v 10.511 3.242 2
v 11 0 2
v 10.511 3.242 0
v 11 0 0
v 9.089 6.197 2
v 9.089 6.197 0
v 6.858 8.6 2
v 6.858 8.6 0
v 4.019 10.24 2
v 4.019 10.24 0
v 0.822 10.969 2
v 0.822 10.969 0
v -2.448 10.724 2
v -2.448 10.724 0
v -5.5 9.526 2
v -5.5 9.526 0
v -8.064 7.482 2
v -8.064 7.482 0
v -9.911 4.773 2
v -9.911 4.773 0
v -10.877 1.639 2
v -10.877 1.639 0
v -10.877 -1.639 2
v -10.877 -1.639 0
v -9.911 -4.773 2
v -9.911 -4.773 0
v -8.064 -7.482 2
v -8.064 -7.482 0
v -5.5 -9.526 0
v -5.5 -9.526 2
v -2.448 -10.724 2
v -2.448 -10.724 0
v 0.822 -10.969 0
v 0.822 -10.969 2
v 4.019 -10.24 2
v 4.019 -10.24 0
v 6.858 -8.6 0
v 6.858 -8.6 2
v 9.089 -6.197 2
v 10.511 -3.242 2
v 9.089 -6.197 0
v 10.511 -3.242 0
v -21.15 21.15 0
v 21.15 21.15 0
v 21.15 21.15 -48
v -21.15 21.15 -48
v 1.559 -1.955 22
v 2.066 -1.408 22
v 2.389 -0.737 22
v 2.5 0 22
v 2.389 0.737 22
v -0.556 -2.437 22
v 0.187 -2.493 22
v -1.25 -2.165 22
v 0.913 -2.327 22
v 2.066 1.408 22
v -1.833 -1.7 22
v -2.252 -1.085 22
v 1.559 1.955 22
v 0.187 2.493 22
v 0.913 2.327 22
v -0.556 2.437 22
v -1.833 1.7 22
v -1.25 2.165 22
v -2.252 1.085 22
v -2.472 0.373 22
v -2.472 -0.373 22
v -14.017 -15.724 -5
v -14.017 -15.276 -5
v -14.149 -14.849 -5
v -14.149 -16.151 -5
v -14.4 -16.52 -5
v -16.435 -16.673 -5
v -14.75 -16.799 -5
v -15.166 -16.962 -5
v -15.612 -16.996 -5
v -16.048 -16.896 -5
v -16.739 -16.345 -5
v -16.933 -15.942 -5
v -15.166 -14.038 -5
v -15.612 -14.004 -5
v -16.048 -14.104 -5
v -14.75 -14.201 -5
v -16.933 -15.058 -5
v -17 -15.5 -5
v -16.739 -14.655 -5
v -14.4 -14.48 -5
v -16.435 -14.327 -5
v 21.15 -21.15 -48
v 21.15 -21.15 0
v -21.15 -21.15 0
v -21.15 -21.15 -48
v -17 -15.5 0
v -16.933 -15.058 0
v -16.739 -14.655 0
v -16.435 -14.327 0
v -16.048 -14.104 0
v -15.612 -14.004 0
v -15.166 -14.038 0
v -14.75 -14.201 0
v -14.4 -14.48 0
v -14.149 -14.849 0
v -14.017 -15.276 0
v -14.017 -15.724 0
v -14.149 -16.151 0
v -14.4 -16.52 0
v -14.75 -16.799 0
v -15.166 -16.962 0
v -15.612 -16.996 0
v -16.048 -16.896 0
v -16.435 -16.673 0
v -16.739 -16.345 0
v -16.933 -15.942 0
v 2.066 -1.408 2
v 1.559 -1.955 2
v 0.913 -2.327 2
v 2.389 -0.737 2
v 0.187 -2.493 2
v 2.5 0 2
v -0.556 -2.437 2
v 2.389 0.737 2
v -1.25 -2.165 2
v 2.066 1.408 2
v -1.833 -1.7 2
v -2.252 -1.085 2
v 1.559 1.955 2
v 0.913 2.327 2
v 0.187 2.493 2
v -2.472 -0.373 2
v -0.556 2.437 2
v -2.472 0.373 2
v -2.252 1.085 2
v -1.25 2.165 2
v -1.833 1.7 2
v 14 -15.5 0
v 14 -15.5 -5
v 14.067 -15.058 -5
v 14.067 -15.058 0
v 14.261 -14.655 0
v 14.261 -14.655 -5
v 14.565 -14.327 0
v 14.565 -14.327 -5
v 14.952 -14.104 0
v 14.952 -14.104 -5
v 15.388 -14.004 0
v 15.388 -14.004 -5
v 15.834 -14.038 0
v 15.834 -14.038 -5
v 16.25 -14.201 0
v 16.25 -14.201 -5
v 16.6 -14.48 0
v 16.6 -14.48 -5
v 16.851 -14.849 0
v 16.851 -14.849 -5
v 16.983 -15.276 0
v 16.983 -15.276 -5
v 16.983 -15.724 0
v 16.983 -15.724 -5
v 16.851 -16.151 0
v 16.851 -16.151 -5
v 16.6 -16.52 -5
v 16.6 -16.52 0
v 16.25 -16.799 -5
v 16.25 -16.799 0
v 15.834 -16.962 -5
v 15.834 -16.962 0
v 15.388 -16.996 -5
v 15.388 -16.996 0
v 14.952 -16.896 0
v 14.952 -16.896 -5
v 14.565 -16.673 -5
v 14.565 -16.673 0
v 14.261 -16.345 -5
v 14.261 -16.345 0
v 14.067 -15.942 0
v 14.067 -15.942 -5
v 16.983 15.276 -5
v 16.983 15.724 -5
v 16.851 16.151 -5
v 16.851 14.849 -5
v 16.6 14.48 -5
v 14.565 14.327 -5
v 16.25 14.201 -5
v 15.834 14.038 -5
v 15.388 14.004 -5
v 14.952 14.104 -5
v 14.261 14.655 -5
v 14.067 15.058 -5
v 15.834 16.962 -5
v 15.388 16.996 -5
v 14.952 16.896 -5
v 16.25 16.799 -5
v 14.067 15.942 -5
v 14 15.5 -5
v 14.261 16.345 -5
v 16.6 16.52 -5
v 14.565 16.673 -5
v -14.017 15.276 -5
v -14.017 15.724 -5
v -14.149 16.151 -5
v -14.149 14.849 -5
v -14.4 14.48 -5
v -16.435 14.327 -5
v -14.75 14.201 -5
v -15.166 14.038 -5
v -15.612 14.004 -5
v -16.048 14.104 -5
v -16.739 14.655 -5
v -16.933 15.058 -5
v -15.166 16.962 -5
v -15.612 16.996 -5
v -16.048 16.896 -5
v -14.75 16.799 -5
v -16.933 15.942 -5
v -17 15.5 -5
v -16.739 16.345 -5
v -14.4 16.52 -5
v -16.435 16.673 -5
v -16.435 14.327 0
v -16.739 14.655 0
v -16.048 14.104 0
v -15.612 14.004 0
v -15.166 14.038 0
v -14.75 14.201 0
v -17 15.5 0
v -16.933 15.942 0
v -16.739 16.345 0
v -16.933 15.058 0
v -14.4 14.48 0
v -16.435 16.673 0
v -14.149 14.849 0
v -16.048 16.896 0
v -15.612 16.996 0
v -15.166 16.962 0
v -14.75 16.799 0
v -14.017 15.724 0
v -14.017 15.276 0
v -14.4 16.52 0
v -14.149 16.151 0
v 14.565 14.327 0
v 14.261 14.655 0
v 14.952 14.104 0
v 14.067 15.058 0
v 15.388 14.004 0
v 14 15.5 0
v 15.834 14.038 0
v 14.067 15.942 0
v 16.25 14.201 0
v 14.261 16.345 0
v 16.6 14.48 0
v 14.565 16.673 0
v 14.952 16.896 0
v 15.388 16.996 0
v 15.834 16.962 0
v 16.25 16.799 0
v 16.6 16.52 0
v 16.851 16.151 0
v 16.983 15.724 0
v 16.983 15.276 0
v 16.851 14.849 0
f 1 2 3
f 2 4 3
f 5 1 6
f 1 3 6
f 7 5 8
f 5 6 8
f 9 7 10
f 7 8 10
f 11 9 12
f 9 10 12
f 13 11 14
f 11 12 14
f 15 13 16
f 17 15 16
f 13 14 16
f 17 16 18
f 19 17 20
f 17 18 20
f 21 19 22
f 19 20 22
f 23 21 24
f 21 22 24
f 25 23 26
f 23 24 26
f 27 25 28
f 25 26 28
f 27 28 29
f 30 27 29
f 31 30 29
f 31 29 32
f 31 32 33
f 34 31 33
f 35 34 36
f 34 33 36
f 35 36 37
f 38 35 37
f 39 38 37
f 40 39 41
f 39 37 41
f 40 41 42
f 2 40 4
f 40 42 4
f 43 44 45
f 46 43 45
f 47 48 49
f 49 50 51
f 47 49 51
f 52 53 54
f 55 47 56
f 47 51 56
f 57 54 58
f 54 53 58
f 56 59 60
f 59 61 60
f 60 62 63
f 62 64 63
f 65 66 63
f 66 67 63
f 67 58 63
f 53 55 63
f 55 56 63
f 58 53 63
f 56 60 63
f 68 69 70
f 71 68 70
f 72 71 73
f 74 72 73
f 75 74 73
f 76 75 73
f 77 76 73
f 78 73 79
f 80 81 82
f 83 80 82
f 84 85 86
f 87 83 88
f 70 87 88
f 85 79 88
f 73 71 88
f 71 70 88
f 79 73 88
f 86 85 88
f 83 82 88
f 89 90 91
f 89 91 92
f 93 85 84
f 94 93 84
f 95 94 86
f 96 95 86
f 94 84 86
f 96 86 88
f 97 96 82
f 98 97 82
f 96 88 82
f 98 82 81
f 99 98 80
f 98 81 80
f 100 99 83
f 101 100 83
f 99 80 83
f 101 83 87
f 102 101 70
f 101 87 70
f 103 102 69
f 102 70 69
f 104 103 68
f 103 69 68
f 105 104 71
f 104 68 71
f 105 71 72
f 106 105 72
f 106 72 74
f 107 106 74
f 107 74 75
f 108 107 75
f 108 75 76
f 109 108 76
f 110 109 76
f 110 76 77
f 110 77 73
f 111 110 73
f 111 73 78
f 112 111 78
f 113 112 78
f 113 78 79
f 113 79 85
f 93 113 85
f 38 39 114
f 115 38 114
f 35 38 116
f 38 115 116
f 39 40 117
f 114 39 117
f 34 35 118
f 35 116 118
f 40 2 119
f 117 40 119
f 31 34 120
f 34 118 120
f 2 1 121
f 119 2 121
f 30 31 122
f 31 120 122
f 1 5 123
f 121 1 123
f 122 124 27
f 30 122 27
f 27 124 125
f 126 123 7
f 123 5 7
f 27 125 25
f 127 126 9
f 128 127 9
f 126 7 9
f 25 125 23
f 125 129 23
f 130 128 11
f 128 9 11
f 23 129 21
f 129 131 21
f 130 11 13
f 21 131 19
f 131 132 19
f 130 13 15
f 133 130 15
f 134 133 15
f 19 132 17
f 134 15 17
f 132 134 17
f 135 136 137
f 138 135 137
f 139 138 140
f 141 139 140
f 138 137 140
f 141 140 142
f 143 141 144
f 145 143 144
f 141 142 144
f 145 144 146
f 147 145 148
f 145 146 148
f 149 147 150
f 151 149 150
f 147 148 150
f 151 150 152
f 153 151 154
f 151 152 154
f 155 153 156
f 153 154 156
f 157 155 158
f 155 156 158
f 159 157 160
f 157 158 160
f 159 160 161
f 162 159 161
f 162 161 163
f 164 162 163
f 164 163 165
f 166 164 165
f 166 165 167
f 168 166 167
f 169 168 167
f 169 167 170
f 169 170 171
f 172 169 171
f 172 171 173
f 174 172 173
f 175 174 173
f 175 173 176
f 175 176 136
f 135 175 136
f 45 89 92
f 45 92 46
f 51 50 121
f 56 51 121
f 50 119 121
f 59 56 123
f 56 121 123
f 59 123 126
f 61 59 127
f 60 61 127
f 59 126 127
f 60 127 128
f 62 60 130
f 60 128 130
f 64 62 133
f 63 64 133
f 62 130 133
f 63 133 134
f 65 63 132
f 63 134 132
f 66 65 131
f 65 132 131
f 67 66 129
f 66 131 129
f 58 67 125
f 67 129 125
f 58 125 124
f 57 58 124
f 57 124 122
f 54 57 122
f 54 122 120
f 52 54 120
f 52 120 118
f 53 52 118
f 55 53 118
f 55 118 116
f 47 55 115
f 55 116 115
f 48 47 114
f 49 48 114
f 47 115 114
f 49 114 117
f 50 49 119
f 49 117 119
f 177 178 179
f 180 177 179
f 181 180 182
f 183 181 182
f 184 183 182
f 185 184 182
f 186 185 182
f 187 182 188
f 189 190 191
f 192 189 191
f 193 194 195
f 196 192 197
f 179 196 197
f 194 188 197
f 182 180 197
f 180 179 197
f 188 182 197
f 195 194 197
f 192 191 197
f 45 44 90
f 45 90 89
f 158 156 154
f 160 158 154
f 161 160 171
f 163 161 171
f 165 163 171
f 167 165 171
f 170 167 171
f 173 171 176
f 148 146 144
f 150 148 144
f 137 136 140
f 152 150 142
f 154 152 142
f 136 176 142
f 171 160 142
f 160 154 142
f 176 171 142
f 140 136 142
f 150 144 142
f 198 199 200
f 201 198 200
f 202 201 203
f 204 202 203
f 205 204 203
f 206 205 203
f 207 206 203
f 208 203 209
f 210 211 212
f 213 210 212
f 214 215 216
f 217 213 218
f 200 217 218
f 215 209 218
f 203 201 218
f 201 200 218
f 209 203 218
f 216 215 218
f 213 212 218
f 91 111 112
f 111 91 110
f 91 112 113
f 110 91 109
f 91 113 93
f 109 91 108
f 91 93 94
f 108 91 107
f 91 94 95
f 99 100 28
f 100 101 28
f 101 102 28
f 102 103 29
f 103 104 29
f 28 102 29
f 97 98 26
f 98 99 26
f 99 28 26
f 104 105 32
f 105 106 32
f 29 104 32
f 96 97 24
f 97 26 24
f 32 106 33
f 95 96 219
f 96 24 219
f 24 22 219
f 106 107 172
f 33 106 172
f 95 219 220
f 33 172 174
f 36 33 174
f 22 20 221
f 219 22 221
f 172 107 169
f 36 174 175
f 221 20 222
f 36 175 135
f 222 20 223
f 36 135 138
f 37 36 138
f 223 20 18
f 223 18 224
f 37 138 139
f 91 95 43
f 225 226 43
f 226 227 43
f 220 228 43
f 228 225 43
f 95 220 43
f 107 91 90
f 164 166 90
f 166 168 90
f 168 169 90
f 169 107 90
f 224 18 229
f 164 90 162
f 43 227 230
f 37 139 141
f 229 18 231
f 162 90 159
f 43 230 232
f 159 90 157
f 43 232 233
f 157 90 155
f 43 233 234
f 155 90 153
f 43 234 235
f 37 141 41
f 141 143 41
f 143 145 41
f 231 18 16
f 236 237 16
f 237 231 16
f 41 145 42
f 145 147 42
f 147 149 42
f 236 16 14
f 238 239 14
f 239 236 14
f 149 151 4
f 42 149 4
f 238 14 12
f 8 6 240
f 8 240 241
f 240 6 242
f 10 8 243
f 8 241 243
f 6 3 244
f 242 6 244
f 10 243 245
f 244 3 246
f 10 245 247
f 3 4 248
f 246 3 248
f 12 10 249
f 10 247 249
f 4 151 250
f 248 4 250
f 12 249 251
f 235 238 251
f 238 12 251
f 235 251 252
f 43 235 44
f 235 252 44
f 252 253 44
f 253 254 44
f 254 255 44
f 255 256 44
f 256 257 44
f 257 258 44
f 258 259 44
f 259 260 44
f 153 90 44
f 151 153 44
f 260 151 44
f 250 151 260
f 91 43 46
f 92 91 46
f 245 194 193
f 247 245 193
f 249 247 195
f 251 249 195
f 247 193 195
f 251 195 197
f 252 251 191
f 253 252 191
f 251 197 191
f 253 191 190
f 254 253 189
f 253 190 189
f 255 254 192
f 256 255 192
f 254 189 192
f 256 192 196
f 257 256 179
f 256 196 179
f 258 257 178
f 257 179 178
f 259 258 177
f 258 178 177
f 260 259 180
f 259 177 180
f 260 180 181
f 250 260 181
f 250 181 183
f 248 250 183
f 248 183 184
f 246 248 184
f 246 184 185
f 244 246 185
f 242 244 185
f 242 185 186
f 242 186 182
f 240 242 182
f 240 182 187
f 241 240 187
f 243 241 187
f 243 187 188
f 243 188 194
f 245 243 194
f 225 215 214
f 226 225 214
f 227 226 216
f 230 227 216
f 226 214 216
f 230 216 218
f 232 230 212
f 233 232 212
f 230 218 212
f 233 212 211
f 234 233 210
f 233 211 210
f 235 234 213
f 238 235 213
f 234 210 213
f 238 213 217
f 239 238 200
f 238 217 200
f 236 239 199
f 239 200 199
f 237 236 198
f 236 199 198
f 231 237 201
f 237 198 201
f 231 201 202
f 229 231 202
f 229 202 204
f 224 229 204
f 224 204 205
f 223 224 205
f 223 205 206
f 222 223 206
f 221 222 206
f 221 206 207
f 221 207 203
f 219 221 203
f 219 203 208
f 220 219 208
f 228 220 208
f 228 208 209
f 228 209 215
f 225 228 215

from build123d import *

# Parameters (mm, degrees)
ESQUISSE1_W                       = 48
ESQUISSE1_H                       = 42.3
BOSS_EXTRU_1_DEPTH                = 42.3
DIAM_TRE_DU_PER_AGE_3_0_3_1_D     = 3
DIAM_TRE_DU_PER_AGE_3_0_3_1_DEPTH = 5


with BuildPart() as part:
    # Esquisse1 → Boss.-Extru.1 (new body)
    with BuildSketch(Plane(origin=(21.15, 0, 0), x_dir=(0, 0, -1), z_dir=(1, 0, 0))):
        with Locations((24, 0)):
            Rectangle(ESQUISSE1_W, ESQUISSE1_H)
    extrude(amount=-BOSS_EXTRU_1_DEPTH)

    # Esquisse2 → Révolution1 (revolve)
    with BuildSketch(Plane(origin=(0, 0, 0), x_dir=(1, 0, 0), z_dir=(0, 1, 0))):
        Polygon((11, 0), (0, 0), (0, -22), (2.5, -22), (2.5, -2), (11, -2), align=None)
    revolve(axis=Axis((0, 0, 0), (0, 0, 1)))

    # Diamètre du perçage Ø3.0 (3)1
    with Locations(Plane.XY):
        with Locations((15.5, 15.5), (15.5, -15.5), (-15.5, 15.5), (-15.5, -15.5)):
            Hole(DIAM_TRE_DU_PER_AGE_3_0_3_1_D / 2, depth=DIAM_TRE_DU_PER_AGE_3_0_3_1_DEPTH)


solid = part.part
